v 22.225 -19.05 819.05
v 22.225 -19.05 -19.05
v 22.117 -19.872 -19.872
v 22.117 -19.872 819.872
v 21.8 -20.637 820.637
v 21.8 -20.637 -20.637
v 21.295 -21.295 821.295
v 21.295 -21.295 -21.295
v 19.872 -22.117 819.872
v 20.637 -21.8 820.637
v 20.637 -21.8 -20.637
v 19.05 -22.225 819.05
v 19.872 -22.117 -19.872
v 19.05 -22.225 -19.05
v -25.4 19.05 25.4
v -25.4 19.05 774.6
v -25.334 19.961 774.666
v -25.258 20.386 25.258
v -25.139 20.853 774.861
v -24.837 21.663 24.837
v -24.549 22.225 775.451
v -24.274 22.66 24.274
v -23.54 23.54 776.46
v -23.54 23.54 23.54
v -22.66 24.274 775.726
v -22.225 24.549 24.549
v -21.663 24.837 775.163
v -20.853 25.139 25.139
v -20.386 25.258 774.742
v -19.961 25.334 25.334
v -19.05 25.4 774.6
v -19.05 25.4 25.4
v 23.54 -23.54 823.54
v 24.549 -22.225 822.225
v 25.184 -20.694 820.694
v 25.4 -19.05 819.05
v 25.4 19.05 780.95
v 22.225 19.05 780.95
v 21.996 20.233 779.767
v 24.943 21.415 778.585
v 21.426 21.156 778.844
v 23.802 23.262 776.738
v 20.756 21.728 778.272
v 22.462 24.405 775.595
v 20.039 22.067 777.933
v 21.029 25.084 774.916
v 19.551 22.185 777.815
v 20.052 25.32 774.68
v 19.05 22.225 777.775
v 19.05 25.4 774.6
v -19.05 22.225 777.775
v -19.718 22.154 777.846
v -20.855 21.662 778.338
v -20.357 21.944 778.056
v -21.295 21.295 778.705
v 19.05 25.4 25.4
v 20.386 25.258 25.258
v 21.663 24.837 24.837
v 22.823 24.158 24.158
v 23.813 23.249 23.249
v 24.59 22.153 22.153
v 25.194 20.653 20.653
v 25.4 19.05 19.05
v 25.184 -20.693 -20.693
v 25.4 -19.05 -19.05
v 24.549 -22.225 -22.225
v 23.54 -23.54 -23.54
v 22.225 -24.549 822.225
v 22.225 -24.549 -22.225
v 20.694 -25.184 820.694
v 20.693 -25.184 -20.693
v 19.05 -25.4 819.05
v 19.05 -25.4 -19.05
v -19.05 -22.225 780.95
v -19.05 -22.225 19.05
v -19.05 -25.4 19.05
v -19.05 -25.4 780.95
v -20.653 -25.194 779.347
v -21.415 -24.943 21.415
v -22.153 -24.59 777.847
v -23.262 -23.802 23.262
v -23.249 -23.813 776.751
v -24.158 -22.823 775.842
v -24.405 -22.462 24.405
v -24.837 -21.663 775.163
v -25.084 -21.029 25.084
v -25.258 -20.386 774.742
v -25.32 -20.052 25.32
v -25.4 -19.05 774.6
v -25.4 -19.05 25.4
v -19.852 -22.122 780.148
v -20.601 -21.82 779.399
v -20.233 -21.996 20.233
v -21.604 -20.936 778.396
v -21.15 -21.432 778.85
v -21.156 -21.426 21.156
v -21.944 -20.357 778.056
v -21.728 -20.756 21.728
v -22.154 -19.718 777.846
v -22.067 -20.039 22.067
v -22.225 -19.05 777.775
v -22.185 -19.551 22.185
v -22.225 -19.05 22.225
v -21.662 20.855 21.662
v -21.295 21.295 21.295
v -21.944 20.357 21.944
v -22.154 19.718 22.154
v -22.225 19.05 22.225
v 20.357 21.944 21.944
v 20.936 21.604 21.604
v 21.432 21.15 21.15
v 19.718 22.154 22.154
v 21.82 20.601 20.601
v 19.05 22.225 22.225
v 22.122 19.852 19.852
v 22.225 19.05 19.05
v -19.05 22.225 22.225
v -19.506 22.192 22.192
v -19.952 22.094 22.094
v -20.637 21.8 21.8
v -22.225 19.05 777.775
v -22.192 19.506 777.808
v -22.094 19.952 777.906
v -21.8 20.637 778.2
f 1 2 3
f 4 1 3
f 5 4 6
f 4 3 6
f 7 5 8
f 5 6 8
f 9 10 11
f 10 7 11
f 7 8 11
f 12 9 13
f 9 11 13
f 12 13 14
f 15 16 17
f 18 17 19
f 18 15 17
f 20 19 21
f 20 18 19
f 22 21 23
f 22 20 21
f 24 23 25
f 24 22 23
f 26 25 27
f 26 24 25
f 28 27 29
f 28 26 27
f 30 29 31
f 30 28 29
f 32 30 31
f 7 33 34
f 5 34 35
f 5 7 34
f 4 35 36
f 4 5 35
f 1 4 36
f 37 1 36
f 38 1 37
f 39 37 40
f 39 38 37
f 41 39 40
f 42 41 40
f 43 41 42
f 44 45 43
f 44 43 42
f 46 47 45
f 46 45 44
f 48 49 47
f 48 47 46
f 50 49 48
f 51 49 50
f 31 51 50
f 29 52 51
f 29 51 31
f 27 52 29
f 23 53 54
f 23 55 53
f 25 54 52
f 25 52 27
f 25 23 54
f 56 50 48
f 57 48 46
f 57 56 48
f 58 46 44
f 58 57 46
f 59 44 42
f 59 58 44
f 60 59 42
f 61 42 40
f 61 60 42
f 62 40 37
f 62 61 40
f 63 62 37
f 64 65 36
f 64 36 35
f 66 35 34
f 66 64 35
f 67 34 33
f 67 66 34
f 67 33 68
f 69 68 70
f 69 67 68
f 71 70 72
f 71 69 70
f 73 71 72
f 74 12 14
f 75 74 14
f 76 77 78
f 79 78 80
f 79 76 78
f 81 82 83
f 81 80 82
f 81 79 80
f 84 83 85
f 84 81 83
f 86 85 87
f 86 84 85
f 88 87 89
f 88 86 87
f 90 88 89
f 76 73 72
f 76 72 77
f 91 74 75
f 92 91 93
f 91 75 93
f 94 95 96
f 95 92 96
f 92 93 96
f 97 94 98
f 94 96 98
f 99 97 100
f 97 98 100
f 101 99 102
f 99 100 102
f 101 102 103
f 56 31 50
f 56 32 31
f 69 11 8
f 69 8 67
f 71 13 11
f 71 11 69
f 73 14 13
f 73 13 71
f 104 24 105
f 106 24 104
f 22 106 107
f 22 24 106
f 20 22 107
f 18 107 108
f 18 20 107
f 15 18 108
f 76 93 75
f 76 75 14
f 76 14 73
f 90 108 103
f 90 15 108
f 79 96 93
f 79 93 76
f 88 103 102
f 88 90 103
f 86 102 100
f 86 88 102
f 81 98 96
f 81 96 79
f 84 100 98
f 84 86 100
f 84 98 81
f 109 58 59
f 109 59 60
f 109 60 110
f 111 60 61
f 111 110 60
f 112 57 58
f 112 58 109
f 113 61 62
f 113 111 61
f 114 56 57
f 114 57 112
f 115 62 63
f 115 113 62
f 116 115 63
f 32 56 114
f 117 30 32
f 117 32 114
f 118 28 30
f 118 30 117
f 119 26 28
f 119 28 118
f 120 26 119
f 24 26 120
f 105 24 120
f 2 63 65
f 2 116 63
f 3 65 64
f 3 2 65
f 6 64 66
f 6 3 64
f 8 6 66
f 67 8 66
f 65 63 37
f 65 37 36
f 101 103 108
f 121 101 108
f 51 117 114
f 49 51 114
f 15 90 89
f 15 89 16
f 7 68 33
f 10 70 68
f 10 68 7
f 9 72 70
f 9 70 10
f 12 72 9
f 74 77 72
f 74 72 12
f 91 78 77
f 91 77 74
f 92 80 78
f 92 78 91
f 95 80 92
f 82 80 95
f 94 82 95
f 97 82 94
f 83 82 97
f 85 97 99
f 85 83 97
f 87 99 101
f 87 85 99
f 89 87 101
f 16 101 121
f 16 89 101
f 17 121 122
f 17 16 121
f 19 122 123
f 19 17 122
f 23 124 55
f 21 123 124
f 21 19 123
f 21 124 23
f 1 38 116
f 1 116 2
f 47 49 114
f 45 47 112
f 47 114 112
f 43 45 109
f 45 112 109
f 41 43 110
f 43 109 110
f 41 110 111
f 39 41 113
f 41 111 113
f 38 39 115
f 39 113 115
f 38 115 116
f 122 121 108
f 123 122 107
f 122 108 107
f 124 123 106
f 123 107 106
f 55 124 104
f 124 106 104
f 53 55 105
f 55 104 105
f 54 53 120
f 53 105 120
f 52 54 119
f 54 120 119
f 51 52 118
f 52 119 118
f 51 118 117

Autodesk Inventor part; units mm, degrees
ref_plane "Plano inicial" through (0, 0, -23.5401) normal (0, 0, 1) x (1, 0, 0)
ref_plane "Plano final" through (0, 0, 823.5401) normal (0, 0, 1) x (1, 0, 0)
sketch "Boceto" plane through (0, 0, 0) normal (0, 0, 1) x (1, 0, 0)
  line L0 (-25.4, -19.05) -> (-25.4, 19.05)
  line L1 (-19.05, 25.4) -> (19.05, 25.4)
  line L2 (25.4, 19.05) -> (25.4, -19.05)
  line L3 (19.05, -25.4) -> (-19.05, -25.4)
  arc A0 (-25.4, -19.05) -> (-19.05, -25.4) centre (-19.05, -19.05) ccw
  arc A1 (-19.05, 25.4) -> (-25.4, 19.05) centre (-19.05, 19.05) ccw
  arc A2 (25.4, 19.05) -> (19.05, 25.4) centre (19.05, 19.05) ccw
  arc A3 (19.05, -25.4) -> (25.4, -19.05) centre (19.05, -19.05) ccw
  arc A4 (-19.05, 22.225) -> (-22.225, 19.05) centre (-19.05, 19.05) ccw
  line L4 (-19.05, 22.225) -> (19.05, 22.225)
  arc A5 (22.225, 19.05) -> (19.05, 22.225) centre (19.05, 19.05) ccw
  line L5 (22.225, 19.05) -> (22.225, -19.05)
  arc A6 (19.05, -22.225) -> (22.225, -19.05) centre (19.05, -19.05) ccw
  line L6 (19.05, -22.225) -> (-19.05, -22.225)
  arc A7 (-22.225, -19.05) -> (-19.05, -22.225) centre (-19.05, -19.05) ccw
  line L7 (-22.225, -19.05) -> (-22.225, 19.05)
  line L8 (0, 37.4012) -> (0, -37.4012) construction
  line L9 (-37.4012, 0) -> (37.4012, 0) construction
  dimension "d10" = 50.8
  dimension "d11" = 50.8
  dimension "d12" = 3.175
  dimension "d15" = 25.4
  dimension "d16" = 25.4
  dimension "d17" = 6.35
extrude "Cuerpo" add sketch "Boceto" along normal up to surface (847.0803 mm away) from surface at -23.5401
sketch "Sketch3" plane through (0, 0, 0) normal (0, 0, 1) x (1, 0, 0)
  line L0 (0, 0) -> (10, 0)
ref_plane "Work Plane3" through (0, 0, 0) normal (0, -1, 0) x (1, 0, 0)
ref_plane "Plano de trabajo4" through (25.4, 0, 825.4) normal (-0.7071, 0, 0.7071) x (0.7071, 0, 0.7071)
split "Dividir1" plane through (25.4, 0, 825.4) removes the side toward (-0.7071, 0, 0.7071)
ref_plane "Plano de trabajo5" through (25.4, 0, -25.4) normal (-0.7071, 0, -0.7071) x (-0.7071, 0, 0.7071)
split "Dividir2" plane through (25.4, 0, -25.4) removes the side toward (-0.7071, 0, -0.7071)
ref_plane "Plano de trabajo6" through (0, -25.4, 825.4) normal (0, 0.7071, 0.7071) x (1, 0, 0)
split "Dividir3" plane through (0, -25.4, 825.4) removes the side toward (0, 0.7071, 0.7071)
ref_plane "Plano de trabajo7" through (0, -25.4, -25.4) normal (0, 0.7071, -0.7071) x (1, 0, 0)
split "Dividir4" plane through (0, -25.4, -25.4) removes the side toward (0, 0.7071, -0.7071)
sketch "Sketch4" plane through (0, 0, 0) normal (0, -1, 0) x (1, 0, 0)
  line L0 (-2, -23.5401) -> (12, -23.5401) projected
  line L1 (-2, 823.5401) -> (12, 823.5401) projected
  dimension "d19" = 847.0803
equation "\"d10\" = G_H"
equation "\"d11\" = G_W"
equation "\"d12\" = G_T"
equation "\"d15\" = 0.5 * d10"
equation "\"d16\" = 0.5 * d11"
equation "\"d17\" = G_IR"
equation "\"d3\" = G_L"
equation "\"G_W\" = 50.8"
equation "\"G_H\" = 50.8"
equation "\"G_T\" = 3.175"
equation "\"G_IR\" = 6.35"
equation "\"G_L\" = d19"
equation "\"G_OFFSET_START\" = 23.54013"
equation "\"G_OFFSET_END\" = 23.54013"
equation "\"d13\" = -G_OFFSET_START"
equation "\"d14\" = G_OFFSET_END + B_L"
equation "\"B_L\" = 800"
properties part number "AISC - 2 x 2 x 1/8 - 33,35" material "Acero, suave"
